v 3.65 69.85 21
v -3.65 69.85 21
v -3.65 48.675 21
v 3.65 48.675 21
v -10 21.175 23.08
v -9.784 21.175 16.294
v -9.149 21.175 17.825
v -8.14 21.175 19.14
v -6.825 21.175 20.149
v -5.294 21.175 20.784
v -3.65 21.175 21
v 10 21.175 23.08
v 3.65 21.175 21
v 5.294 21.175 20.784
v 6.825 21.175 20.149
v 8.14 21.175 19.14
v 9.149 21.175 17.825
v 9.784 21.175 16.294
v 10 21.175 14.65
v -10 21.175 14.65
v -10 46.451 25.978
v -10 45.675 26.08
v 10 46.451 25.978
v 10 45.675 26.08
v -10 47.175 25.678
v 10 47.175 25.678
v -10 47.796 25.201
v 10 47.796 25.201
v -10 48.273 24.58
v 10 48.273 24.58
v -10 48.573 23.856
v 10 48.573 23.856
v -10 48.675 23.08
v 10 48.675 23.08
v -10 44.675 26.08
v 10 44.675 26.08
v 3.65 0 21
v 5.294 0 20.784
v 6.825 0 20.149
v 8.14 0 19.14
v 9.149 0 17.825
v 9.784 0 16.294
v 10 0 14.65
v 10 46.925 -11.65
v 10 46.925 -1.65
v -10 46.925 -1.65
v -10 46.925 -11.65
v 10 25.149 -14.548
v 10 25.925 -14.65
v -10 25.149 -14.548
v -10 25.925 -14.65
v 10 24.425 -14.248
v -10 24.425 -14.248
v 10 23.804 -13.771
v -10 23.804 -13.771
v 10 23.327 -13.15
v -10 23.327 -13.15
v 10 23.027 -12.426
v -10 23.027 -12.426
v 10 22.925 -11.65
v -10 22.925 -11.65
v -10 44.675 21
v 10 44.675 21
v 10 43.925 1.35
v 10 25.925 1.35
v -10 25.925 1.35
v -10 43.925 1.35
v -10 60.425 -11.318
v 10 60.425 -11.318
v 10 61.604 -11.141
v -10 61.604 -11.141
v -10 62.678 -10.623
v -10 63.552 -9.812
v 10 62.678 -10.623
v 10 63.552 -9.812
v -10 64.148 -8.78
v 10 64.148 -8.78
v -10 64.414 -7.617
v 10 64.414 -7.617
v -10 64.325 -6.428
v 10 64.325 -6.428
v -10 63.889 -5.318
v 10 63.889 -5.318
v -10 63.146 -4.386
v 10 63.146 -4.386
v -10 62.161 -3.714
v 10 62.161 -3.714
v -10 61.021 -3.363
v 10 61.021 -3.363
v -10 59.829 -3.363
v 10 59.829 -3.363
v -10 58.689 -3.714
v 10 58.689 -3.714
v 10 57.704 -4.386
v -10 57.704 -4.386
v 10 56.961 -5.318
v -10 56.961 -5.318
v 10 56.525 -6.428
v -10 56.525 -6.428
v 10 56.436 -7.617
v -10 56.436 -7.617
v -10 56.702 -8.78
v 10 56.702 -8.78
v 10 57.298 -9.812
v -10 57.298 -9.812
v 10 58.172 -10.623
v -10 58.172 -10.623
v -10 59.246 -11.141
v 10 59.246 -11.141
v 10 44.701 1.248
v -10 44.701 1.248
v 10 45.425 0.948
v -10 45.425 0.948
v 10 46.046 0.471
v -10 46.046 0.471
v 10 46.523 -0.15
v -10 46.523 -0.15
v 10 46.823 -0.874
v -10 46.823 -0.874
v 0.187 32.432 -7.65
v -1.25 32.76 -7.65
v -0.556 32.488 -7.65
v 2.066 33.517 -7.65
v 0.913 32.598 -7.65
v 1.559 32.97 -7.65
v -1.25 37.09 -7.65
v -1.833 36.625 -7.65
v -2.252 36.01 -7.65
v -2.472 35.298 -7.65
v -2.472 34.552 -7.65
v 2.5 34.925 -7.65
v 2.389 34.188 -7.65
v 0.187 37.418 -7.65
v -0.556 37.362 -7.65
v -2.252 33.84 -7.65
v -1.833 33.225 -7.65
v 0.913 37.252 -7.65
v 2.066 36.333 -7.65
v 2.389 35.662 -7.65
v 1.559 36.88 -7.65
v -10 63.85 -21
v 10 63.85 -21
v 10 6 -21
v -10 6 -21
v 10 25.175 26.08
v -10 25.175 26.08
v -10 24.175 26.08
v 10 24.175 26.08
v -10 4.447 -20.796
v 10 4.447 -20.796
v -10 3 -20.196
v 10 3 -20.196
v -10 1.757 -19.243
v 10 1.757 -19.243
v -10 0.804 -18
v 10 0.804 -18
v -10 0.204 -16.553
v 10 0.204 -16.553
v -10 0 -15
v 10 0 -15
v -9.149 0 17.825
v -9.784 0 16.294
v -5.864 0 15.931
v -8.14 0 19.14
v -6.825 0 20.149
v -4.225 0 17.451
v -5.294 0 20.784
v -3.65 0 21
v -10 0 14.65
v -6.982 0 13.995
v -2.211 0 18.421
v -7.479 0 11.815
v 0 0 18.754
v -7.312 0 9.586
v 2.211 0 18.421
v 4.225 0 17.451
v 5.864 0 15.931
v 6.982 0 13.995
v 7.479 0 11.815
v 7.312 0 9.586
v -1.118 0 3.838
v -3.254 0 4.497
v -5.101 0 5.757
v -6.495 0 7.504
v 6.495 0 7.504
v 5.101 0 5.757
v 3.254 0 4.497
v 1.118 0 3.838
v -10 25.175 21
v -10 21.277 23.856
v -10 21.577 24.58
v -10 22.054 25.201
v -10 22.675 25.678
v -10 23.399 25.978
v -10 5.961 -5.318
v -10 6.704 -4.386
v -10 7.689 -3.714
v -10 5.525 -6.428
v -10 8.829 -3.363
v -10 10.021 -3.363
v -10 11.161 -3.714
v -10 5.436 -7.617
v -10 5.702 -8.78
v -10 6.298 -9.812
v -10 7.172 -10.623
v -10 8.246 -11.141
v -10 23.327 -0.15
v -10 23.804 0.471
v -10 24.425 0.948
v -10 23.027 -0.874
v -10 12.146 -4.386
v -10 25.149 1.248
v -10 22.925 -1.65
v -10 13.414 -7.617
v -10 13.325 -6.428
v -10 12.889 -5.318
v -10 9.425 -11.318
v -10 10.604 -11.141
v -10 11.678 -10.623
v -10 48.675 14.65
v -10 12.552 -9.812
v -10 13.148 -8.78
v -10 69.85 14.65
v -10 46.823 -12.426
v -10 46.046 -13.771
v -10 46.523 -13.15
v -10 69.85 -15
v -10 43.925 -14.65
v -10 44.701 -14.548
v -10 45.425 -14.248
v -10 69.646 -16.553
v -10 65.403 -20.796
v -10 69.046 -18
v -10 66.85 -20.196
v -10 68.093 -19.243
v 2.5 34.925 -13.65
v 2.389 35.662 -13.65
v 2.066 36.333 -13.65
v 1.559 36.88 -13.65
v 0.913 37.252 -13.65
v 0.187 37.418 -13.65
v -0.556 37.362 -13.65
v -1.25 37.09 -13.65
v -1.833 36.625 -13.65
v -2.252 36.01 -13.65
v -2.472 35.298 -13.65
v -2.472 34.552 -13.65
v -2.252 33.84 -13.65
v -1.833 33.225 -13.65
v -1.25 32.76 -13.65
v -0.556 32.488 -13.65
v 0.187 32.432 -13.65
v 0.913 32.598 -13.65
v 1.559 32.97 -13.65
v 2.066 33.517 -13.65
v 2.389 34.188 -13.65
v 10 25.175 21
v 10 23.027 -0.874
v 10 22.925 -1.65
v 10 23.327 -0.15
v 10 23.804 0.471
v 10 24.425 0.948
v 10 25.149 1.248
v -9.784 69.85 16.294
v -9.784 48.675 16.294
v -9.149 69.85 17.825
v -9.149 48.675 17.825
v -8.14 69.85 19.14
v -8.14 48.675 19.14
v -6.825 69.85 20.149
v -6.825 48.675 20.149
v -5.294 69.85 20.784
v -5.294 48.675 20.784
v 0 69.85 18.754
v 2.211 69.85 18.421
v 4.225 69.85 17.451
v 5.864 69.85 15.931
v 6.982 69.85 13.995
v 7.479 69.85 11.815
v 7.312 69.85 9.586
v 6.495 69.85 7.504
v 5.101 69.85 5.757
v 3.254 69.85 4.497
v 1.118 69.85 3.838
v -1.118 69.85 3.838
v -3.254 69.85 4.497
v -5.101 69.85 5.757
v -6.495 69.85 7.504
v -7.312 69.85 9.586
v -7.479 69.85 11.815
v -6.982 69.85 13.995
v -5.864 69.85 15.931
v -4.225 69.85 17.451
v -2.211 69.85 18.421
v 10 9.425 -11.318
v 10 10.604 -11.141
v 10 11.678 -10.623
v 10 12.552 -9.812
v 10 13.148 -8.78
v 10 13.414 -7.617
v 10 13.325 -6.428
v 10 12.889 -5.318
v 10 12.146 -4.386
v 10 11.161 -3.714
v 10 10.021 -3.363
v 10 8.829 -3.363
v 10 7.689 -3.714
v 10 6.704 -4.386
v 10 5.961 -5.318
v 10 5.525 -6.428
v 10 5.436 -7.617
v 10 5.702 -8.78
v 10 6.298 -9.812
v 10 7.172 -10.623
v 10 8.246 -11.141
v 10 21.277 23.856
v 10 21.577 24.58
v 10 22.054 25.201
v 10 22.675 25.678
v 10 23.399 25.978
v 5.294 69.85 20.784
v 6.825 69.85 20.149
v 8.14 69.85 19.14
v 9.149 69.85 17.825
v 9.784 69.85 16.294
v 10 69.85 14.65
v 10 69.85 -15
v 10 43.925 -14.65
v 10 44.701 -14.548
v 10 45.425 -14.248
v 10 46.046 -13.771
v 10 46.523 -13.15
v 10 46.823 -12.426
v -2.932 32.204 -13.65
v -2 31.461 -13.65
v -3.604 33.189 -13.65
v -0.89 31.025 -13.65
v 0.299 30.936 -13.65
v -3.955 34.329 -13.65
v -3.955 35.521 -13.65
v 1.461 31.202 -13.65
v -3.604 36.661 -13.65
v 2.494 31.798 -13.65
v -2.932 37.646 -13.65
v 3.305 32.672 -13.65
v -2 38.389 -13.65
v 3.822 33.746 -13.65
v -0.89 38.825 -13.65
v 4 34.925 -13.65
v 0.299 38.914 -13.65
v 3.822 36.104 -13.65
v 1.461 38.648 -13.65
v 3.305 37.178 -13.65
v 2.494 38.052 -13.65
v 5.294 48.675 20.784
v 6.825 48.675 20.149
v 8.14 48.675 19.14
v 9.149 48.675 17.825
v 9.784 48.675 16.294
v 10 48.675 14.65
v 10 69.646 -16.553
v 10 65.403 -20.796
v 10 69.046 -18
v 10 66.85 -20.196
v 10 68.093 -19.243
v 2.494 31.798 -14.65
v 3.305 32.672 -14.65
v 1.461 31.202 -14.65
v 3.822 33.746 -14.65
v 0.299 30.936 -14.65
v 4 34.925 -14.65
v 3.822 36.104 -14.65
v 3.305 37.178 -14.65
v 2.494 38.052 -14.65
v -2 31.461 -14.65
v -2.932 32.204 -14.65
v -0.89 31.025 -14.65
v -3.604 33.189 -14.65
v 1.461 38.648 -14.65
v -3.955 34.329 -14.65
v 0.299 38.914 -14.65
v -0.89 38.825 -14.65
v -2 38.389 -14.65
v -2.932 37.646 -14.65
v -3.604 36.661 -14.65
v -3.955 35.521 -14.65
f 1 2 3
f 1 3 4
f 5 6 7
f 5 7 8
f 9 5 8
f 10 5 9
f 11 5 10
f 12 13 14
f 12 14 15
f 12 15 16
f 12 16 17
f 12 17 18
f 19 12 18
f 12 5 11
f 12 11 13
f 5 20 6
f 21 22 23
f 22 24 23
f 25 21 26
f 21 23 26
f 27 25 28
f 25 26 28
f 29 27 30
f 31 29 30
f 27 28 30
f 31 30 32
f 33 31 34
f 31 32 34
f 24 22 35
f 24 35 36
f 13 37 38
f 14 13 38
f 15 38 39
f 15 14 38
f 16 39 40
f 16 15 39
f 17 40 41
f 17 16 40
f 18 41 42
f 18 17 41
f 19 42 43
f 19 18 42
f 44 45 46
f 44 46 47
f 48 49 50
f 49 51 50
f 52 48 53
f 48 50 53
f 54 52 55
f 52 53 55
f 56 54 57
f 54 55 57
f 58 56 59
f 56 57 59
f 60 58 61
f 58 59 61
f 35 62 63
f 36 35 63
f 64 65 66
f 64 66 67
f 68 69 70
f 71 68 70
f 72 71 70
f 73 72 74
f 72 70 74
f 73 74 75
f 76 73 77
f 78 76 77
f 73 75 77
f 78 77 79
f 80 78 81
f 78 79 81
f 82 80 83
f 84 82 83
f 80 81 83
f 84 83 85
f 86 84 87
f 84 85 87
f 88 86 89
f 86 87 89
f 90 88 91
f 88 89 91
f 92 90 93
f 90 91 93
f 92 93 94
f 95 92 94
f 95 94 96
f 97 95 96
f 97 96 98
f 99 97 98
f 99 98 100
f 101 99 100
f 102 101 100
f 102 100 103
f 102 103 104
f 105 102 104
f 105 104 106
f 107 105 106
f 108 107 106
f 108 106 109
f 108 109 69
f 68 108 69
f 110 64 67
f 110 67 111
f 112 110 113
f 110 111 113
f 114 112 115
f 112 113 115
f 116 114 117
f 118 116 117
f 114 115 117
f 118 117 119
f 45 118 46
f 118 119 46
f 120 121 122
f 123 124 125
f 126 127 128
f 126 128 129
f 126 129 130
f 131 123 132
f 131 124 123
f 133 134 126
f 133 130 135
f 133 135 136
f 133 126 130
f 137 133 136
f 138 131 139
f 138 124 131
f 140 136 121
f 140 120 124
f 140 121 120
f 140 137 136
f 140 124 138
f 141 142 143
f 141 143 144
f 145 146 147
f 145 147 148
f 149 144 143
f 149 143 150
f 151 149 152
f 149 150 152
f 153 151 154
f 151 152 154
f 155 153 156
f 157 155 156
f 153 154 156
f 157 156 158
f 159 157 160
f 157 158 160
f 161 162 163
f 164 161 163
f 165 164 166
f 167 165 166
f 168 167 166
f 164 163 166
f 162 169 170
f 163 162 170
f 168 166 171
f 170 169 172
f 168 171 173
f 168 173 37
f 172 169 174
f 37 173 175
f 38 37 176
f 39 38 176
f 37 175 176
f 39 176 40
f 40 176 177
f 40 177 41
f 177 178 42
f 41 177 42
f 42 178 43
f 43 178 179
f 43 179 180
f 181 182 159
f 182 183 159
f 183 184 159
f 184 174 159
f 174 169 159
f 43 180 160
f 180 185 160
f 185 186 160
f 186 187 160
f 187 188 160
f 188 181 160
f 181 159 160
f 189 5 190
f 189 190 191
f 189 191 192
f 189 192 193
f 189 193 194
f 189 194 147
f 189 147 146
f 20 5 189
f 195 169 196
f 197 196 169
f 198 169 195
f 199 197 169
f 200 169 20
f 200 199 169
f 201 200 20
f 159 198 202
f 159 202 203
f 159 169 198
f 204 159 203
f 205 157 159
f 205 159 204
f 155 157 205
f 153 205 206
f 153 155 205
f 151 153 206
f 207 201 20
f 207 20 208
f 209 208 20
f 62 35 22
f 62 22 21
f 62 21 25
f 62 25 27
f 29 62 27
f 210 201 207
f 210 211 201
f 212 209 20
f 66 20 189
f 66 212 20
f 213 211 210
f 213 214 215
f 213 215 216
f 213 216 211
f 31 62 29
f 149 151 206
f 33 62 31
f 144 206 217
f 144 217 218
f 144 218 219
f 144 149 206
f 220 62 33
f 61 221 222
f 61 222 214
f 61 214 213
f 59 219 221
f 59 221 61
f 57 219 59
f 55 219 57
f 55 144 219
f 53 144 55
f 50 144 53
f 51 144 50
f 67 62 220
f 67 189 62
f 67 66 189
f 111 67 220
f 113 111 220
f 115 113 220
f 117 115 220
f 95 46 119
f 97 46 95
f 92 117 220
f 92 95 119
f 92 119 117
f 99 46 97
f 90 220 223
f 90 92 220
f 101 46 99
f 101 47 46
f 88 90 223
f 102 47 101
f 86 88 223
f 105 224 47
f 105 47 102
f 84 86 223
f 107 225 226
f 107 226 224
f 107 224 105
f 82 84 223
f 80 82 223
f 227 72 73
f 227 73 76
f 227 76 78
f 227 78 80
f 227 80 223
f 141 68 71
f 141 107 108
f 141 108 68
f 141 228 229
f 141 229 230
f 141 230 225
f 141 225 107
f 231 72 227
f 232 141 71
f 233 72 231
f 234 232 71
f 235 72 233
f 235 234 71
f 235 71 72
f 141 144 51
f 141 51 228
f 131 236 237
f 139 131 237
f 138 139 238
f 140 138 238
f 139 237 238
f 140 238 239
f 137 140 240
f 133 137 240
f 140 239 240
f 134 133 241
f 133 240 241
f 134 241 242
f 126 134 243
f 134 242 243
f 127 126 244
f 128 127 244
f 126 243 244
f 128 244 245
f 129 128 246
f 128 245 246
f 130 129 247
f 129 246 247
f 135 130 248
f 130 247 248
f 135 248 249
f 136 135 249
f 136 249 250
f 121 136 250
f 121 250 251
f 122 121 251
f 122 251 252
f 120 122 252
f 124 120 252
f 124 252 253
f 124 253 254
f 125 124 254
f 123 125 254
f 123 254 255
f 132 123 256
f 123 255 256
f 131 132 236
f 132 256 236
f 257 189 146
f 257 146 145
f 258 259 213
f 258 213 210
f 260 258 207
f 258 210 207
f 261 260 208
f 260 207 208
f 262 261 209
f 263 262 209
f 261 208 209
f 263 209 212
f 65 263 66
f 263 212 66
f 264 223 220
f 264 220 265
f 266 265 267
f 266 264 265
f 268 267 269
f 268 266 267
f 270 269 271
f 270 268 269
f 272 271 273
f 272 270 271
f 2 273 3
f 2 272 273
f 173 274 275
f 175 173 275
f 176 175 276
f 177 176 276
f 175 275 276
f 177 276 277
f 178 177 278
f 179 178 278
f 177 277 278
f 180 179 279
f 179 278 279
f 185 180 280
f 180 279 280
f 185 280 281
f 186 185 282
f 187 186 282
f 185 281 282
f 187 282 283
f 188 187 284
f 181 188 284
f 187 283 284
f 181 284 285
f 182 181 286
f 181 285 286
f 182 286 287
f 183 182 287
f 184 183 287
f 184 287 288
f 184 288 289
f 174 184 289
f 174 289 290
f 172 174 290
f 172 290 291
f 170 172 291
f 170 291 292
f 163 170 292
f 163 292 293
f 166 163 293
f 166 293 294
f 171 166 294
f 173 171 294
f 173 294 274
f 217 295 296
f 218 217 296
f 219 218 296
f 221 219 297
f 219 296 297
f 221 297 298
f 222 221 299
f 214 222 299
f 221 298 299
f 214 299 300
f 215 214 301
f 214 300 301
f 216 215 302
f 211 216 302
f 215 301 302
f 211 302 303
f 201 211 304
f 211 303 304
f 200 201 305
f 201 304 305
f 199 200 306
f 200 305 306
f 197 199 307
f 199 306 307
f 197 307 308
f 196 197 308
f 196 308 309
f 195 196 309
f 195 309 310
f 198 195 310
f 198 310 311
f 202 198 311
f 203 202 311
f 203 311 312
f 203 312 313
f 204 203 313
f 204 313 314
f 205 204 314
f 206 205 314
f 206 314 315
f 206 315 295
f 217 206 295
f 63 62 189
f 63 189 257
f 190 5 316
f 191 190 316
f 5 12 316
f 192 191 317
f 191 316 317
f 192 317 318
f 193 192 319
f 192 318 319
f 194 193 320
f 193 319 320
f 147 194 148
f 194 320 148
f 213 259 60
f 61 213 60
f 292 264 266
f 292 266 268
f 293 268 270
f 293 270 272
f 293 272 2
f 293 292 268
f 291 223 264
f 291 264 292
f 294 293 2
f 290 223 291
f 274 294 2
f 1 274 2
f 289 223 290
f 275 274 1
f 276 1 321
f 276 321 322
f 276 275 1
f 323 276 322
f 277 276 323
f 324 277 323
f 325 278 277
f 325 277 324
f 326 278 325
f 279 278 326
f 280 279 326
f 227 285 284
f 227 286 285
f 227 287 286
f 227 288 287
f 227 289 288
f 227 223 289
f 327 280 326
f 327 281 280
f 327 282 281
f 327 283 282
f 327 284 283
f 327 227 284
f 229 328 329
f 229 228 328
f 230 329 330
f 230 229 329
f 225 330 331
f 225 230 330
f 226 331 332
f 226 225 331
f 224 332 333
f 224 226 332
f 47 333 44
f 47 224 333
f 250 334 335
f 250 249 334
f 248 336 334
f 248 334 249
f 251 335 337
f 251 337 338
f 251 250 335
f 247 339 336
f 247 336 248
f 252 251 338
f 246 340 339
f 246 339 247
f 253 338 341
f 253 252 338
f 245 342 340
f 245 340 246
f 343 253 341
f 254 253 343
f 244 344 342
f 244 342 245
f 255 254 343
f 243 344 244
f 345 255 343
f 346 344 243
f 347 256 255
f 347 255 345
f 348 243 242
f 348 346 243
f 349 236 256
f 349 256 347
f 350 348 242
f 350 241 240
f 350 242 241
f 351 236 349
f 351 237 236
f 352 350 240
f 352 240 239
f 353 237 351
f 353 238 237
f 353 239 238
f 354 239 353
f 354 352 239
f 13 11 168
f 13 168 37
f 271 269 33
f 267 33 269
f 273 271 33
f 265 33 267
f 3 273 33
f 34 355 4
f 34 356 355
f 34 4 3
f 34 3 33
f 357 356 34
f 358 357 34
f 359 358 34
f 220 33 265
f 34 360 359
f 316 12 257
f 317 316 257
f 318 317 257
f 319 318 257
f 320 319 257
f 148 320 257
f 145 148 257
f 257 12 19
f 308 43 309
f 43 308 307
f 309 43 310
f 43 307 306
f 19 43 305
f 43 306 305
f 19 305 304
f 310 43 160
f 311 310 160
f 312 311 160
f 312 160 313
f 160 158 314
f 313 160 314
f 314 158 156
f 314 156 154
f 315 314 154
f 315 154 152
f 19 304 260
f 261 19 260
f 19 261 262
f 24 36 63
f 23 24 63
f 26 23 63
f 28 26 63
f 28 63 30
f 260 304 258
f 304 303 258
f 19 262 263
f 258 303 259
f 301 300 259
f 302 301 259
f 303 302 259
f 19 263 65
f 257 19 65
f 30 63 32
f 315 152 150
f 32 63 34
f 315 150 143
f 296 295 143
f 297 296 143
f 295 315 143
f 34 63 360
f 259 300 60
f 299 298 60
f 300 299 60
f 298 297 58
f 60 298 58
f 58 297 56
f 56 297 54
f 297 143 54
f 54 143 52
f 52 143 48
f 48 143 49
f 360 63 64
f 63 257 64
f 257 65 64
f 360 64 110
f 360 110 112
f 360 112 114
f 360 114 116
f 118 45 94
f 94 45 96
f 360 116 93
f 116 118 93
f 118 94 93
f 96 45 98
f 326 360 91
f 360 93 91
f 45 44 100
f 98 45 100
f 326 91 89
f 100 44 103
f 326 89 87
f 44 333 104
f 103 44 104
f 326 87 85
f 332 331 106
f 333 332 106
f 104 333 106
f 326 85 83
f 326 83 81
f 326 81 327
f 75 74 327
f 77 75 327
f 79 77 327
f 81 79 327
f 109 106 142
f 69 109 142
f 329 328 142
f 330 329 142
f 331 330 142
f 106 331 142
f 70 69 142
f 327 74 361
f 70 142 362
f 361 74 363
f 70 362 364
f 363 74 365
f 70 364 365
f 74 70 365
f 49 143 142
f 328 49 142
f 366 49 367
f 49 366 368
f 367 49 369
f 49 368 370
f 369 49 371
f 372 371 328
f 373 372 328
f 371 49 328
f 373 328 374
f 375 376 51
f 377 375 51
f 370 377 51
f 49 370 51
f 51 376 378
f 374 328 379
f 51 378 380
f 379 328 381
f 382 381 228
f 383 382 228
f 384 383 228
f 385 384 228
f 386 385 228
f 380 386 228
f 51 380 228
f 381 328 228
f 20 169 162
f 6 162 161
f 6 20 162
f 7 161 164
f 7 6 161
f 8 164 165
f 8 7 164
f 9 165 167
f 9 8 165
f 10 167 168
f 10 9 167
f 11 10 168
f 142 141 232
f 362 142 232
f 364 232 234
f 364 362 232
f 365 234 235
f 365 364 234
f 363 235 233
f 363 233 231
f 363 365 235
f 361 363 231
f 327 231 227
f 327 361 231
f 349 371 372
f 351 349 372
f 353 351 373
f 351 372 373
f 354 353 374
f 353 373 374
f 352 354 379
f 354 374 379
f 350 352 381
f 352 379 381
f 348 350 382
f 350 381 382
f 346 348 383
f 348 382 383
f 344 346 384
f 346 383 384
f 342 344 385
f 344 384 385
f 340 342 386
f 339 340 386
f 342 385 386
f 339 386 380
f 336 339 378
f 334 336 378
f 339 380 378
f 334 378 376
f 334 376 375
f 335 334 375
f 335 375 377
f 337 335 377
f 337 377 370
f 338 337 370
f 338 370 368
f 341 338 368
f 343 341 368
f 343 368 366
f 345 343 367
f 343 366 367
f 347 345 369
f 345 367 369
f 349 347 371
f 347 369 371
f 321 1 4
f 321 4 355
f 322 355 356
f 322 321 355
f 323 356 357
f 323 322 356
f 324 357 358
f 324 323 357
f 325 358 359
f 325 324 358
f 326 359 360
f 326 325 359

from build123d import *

# Parameters (mm, degrees)
SKETCH1_W           = 20
SKETCH1_H           = 42
BOSS_EXTRUDE1_DEPTH = 69.85
FILLET1_R           = 6.35
SKETCH3_W           = 42
SKETCH3_H           = 42
BOSS_EXTRUDE2_DEPTH = 6.35
SKETCH4_W           = 16
SKETCH4_H           = 24
CUT_EXTRUDE2_DEPTH  = 80.252902155
SKETCH8_R           = 4
CUT_EXTRUDE5_DEPTH  = 80.252902155
FILLET2_R           = 6
FILLET3_R           = 4
FILLET4_R           = 3
SKETCH9_W           = 11
SKETCH9_H           = 42
CUT_EXTRUDE6_DEPTH  = 85.166635314
SKETCH10_R          = 4.000000001
BOSS_EXTRUDE3_DEPTH = 1
SKETCH11_R          = 2.5
BOSS_EXTRUDE4_DEPTH = 6
SKETCH12_W          = 20
SKETCH12_H          = 27.5
BOSS_EXTRUDE5_DEPTH = 6.35
SKETCH13_W          = 20
SKETCH13_H          = 4
BOSS_EXTRUDE6_DEPTH = 5.08
SKETCH2_R           = 7.5
CUT_EXTRUDE1_DEPTH  = 76.227580713
FILLET5_R           = 3


with BuildPart() as part:
    # Sketch1 → Boss-Extrude1 (new body)
    with BuildSketch(Plane(origin=(0, 0, 0), x_dir=(1, 0, 0), z_dir=(0, 1, 0))):
        Rectangle(SKETCH1_W, SKETCH1_H)
    extrude(amount=BOSS_EXTRUDE1_DEPTH)

    # Fillet1
    fillet1_edges = [part.edges().sort_by_distance(p)[0] for p in [
        (10, 34.925, 21),
        (-10, 34.925, 21),
    ]]
    fillet(fillet1_edges, radius=FILLET1_R)

    # Sketch3 → Boss-Extrude2 (add)
    with BuildSketch(Plane(origin=(0, 0, -21), x_dir=(-1, 0, 0), z_dir=(0, 0, -1))):
        with Locations((0, 34.925)):
            Rectangle(SKETCH3_W, SKETCH3_H)
    extrude(amount=-BOSS_EXTRUDE2_DEPTH)

    # Sketch4 → Cut-Extrude2 (cut, through all)
    with BuildSketch(Plane(origin=(10, 0, 0), x_dir=(0, 0, -1), z_dir=(1, 0, 0))):
        with Locations((6.65, 34.925)):
            Rectangle(SKETCH4_W, SKETCH4_H)
    extrude(amount=-CUT_EXTRUDE2_DEPTH, mode=Mode.SUBTRACT)

    # Sketch8 → Cut-Extrude5 (cut, through all)
    with BuildSketch(Plane(origin=(10, 0, 0), x_dir=(0, 0, -1), z_dir=(1, 0, 0))):
        with Locations((7.318215362, 60.425)):
            Circle(SKETCH8_R)
        with Locations((7.318215362, 9.425)):
            Circle(SKETCH8_R)
    extrude(amount=-CUT_EXTRUDE5_DEPTH, mode=Mode.SUBTRACT)

    # Fillet2
    fillet2_edges = [part.edges().sort_by_distance(p)[0] for p in [
        (0, 0, -21),
        (0, 69.85, -21),
    ]]
    fillet(fillet2_edges, radius=FILLET2_R)

    # Fillet3
    fillet3_edges = [part.edges().sort_by_distance(p)[0] for p in [
        (-21, 13.925, -17.825),
        (21, 55.925, -17.825),
        (-21, 55.925, -17.825),
        (21, 13.925, -17.825),
    ]]
    fillet(fillet3_edges, radius=FILLET3_R)

    # Fillet4
    fillet4_edges = [part.edges().sort_by_distance(p)[0] for p in [
        (0, 22.925, 1.35),
        (0, 46.925, -14.65),
        (0, 22.925, -14.65),
        (0, 46.925, 1.35),
    ]]
    fillet(fillet4_edges, radius=FILLET4_R)

    # Sketch9 → Cut-Extrude6 (cut, through all)
    with BuildSketch(Plane(origin=(0, 0, -21), x_dir=(-1, 0, 0), z_dir=(0, 0, -1))):
        with Locations((-15.5, 34.925)):
            Rectangle(SKETCH9_W, SKETCH9_H)
        with Locations((15.5, 34.925)):
            Rectangle(SKETCH9_W, SKETCH9_H)
    extrude(amount=-CUT_EXTRUDE6_DEPTH, mode=Mode.SUBTRACT)

    # Sketch10 → Boss-Extrude3 (add)
    with BuildSketch(Plane.XY.offset(-14.65)):
        with Locations((0, 34.925)):
            Circle(SKETCH10_R)
    extrude(amount=BOSS_EXTRUDE3_DEPTH)

    # Sketch11 → Boss-Extrude4 (add)
    with BuildSketch(Plane.XY.offset(-13.65)):
        with Locations((0, 34.925)):
            Circle(SKETCH11_R)
    extrude(amount=BOSS_EXTRUDE4_DEPTH)

    # Sketch12 → Boss-Extrude5 (add)
    with BuildSketch(Plane.XY.offset(21)):
        with Locations((0, 34.925)):
            Rectangle(SKETCH12_W, SKETCH12_H)
    extrude(amount=-BOSS_EXTRUDE5_DEPTH)

    # Sketch13 → Boss-Extrude6 (add)
    with BuildSketch(Plane.XY.offset(21)):
        with Locations((0, 46.675)):
            Rectangle(SKETCH13_W, SKETCH13_H)
        with Locations((0, 23.175)):
            Rectangle(SKETCH13_W, SKETCH13_H)
    extrude(amount=BOSS_EXTRUDE6_DEPTH)

    # Sketch2 → Cut-Extrude1 (cut, through all)
    with BuildSketch(Plane(origin=(0, 69.85, 0), x_dir=(1, 0, 0), z_dir=(0, 1, 0))):
        with Locations(Location((0, -11.254449914, 0), (0, 0, 270))):
            Circle(SKETCH2_R)
    extrude(amount=-CUT_EXTRUDE1_DEPTH, mode=Mode.SUBTRACT)

    # Fillet5
    fillet5_edges = [part.edges().sort_by_distance(p)[0] for p in [
        (0, 21.175, 26.08),
        (0, 48.675, 26.08),
    ]]
    fillet(fillet5_edges, radius=FILLET5_R)


solid = part.part
